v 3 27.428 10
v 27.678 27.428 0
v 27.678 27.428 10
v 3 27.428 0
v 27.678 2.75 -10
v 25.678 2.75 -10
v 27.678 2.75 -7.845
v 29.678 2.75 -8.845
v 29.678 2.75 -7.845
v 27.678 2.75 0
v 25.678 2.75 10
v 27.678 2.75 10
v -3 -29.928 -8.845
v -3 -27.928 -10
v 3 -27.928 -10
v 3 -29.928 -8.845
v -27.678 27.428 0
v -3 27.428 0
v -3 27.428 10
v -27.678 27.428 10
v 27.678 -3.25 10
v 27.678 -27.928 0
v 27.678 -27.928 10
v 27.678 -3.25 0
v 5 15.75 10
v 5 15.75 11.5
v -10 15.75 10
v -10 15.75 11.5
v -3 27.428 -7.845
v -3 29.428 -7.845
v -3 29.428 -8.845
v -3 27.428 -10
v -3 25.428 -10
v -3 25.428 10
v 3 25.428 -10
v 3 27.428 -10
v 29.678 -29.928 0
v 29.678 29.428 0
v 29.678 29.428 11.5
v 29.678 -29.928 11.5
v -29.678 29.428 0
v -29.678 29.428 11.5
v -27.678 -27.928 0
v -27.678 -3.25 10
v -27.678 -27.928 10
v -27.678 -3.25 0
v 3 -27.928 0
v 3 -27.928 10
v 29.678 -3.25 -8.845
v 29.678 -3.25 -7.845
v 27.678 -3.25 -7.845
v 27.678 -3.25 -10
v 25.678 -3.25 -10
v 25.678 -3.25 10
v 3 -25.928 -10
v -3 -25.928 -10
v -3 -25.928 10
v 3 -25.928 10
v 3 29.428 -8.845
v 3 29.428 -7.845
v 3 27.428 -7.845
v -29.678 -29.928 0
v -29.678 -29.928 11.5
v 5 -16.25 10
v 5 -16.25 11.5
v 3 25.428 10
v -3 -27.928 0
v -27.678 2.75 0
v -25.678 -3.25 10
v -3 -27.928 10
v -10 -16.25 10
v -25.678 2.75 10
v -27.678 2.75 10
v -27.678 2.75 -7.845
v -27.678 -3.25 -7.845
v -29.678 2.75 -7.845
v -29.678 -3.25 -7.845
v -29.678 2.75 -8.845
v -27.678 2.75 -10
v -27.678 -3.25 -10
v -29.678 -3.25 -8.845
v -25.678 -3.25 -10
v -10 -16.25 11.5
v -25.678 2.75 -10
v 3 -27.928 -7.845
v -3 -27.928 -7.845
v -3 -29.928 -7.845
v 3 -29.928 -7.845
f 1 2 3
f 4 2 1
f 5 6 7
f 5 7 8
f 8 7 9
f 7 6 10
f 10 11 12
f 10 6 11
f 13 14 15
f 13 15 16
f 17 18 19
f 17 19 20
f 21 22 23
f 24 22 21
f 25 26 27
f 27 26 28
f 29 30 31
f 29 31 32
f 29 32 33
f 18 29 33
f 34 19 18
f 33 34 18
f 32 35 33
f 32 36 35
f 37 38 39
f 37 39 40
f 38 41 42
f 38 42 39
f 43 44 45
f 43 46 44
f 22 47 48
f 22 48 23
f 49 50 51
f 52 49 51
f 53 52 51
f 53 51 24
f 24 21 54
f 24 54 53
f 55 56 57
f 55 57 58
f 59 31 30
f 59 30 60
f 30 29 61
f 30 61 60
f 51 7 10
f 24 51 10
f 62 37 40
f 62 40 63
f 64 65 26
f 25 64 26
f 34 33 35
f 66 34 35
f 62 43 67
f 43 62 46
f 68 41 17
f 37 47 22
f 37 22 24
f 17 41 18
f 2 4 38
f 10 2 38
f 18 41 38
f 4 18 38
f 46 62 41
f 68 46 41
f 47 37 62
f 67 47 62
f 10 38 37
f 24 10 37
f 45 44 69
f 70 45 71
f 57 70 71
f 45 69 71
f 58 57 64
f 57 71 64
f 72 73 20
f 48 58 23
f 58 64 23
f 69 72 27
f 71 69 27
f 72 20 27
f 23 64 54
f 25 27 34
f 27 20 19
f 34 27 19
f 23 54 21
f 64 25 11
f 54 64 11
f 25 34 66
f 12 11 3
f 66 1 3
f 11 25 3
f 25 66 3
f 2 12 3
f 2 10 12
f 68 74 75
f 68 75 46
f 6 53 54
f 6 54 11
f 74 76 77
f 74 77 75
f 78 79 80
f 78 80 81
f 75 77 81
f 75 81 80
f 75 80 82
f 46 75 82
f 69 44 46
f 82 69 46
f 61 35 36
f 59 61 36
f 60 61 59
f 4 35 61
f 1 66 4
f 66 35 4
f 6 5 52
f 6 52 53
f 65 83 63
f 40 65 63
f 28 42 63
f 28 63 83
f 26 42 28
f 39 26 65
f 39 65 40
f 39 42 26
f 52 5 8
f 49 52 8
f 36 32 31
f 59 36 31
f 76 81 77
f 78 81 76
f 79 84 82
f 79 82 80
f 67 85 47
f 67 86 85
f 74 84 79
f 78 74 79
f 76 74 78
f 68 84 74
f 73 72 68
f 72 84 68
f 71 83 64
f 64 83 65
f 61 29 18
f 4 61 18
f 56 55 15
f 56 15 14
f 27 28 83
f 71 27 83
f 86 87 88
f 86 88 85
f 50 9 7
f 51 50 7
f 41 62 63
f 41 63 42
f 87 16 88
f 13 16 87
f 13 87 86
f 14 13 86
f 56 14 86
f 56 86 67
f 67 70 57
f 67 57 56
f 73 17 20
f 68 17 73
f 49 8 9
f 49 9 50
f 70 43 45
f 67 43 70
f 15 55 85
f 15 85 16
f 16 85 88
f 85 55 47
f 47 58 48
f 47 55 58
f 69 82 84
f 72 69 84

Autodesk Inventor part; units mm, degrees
ref_plane "YZ Plane" through (0, 0, 0) normal (1, 0, 0) x (0, 1, 0)
ref_plane "XZ Plane" through (0, 0, 0) normal (0, 1, 0) x (-1, 0, 0)
ref_plane "XY Plane" through (0, 0, 0) normal (0, 0, 1) x (1, 0, 0)
sketch "Эскиз1" plane through (0, 0, 0) normal (0, 0, 1) x (1, 0, 0)
  line L0 (41.178, 40.928) -> (-41.178, 40.928) construction
  line L1 (-41.178, 40.928) -> (-41.178, -40.928) construction
  line L2 (-41.178, -40.928) -> (41.178, -40.928) construction
  line L3 (41.178, -40.928) -> (41.178, 40.928) construction
  circle A0 centre (22.7283, 19.0964) radius 1 construction
  circle A1 centre (19.3464, -22.9783) radius 1 construction
  line L4 (17.2251, 27.428) -> (22.7282, 21.9249) construction
  line L5 (22.7282, 21.9249) -> (19.8998, 19.0964) construction
  line L6 (19.8998, 19.0964) -> (22.7282, 16.268) construction
  line L7 (22.7282, 16.268) -> (25.5567, 19.0964) construction
  line L8 (25.5567, 19.0964) -> (27.678, 16.9751) construction
  line L9 (27.678, 16.9751) -> (27.678, -17.4751) construction
  line L10 (27.678, -17.4751) -> (22.1749, -22.9783) construction
  line L11 (22.1749, -22.9783) -> (19.3464, -20.1498) construction
  line L12 (19.3464, -20.1498) -> (16.518, -22.9783) construction
  line L13 (16.518, -22.9783) -> (19.3464, -25.8067) construction
  line L14 (19.3464, -25.8067) -> (17.2251, -27.928) construction
  line L15 (17.2251, -27.928) -> (-17.2251, -27.928) construction
  line L16 (-17.2251, -27.928) -> (-19.3464, -25.8067) construction
  line L17 (-19.3464, -25.8067) -> (-16.518, -22.9783) construction
  line L18 (-16.518, -22.9783) -> (-19.3464, -20.1498) construction
  line L19 (-19.3464, -20.1498) -> (-22.1749, -22.9783) construction
  line L20 (-22.1749, -22.9783) -> (-27.678, -17.4751) construction
  line L21 (-27.678, -17.4751) -> (-27.678, 16.9751) construction
  line L22 (-27.678, 16.9751) -> (-25.9871, 18.666) construction
  line L23 (-17.2251, 27.428) -> (17.2251, 27.428) construction
  line L24 (27.678, 27.428) -> (-27.678, 27.428)
  line L25 (-27.678, 27.428) -> (-27.678, -27.928)
  line L26 (-27.678, -27.928) -> (27.678, -27.928)
  line L27 (27.678, -27.928) -> (27.678, 27.428)
  line L28 (29.678, -29.928) -> (-29.678, -29.928)
  line L29 (-29.678, -29.928) -> (-29.678, 29.428)
  line L30 (-29.678, 29.428) -> (29.678, 29.428)
  line L31 (29.678, 29.428) -> (29.678, -29.928)
  circle A2 centre (-23.1587, 18.7154) radius 1 projected
  circle A3 centre (-19.3738, -22.9783) radius 1 projected
  line L32 (-25.9871, 18.666) -> (-23.1587, 15.8376) projected
  line L33 (-23.1587, 15.8376) -> (-20.3302, 18.666) projected
  line L34 (-20.3302, 18.666) -> (-23.1587, 21.4944) projected
  line L35 (-23.1587, 21.4944) -> (-17.2251, 27.428) projected
  point P0 (0, 0)
  dimension "d0" = 2
extrude "Выдавливание1" add sketch "Эскиз1" along normal blind 10 contours L28 L29 L30 L31
sketch "Эскиз2" plane through (0, 0, 10) normal (0, 0, 1) x (1, 0, 0)
  line L0 (29.678, 29.428) -> (-29.678, 29.428) projected
  line L1 (-29.678, 29.428) -> (-29.678, -29.928) projected
  line L2 (29.678, 29.428) -> (-29.678, 29.428)
  line L3 (-29.678, 29.428) -> (-29.678, -29.928)
  line L4 (-29.678, -29.928) -> (29.678, -29.928)
  line L5 (29.678, -29.928) -> (29.678, 29.428)
  point P0 (0, 0)
extrude "Выдавливание2" add sketch "Эскиз2" along normal blind 1.5
sketch "Эскиз3" plane through (0, 0, 10) normal (0, 0, -1) x (-1, 0, 0)
  line L0 (-27.678, 27.428) -> (-27.678, -27.928) construction
  line L1 (-27.678, -27.928) -> (27.678, -27.928) construction
  line L2 (27.678, -27.928) -> (27.678, 27.428) construction
  line L3 (27.678, 27.428) -> (-27.678, 27.428) construction
  line L4 (-29.678, -29.928) -> (-29.678, 29.428) construction
  line L5 (-29.678, -3.25) -> (-25.678, -3.25)
  line L6 (-25.678, -3.25) -> (-25.678, 2.75)
  line L7 (-25.678, 2.75) -> (-29.678, 2.75)
  line L8 (-29.678, 2.75) -> (-29.678, -3.25)
  line L9 (-27.678, 27.428) -> (-27.678, -27.928) construction
  line L10 (-27.678, -0.25) -> (27.678, -0.25) construction
  line L11 (0, -27.928) -> (0, 27.428) construction
  line L12 (29.678, -3.25) -> (25.678, -3.25)
  line L13 (25.678, -3.25) -> (25.678, 2.75)
  line L14 (25.678, 2.75) -> (29.678, 2.75)
  line L15 (29.678, 2.75) -> (29.678, -3.25)
  line L16 (-29.678, 29.428) -> (29.678, 29.428) construction
  line L17 (-3, 29.428) -> (3, 29.428)
  line L18 (3, 29.428) -> (3, 25.428)
  line L19 (3, 25.428) -> (-3, 25.428)
  line L20 (-3, 25.428) -> (-3, 29.428)
  line L21 (-3, -29.928) -> (3, -29.928)
  line L22 (3, -29.928) -> (3, -25.928)
  line L23 (3, -25.928) -> (-3, -25.928)
  line L24 (-3, -25.928) -> (-3, -29.928)
  point P0 (0, 0)
  dimension "d5" = 4
  dimension "d6" = 6
  dimension "d7" = 3
  dimension "d8" = 6
  dimension "d9" = 4
  dimension "d10" = 3
extrude "Выдавливание3" add sketch "Эскиз3" along normal blind 20
sketch "Эскиз4" plane through (0, 0, 11.5) normal (0, 0, 1) x (1, 0, 0)
  line L0 (-10, -16.25) -> (5, -16.25)
  line L1 (5, -16.25) -> (5, 15.75)
  line L2 (5, 15.75) -> (-10, 15.75)
  line L3 (-10, 15.75) -> (-10, -16.25)
  line L4 (-29.678, 29.428) -> (-29.678, -29.928) construction
  point P0 (0, 0)
  point P1 (-29.678, -0.25)
  dimension "d13" = 15
  dimension "d14" = 32
  dimension "d15" = 16
  dimension "d16" = 5
extrude "Выдавливание4" cut sketch "Эскиз4" against normal through all
sketch "Эскиз5" plane through (-3, -27.928, 10) normal (-1, 0, 0) x (0, 0, 1)
  line L0 (-20, -2) -> (-20, 2) projected
  line L1 (-20, 0) -> (-18.8453, -2)
  line L2 (-10, -2) -> (-20, -2) projected
  line L3 (-20, 0) -> (-17.6906, 0) construction
  line L4 (-18.8453, -2) -> (-17.8453, -2)
  line L5 (0, 2) -> (-20, 2) projected
  line L6 (-17.8453, -2) -> (-17.8453, 0)
  line L7 (-10, -2) -> (-10, 0) projected
  line L8 (-17.8453, 0) -> (-10, 0)
  line L9 (-10, 0) -> (-10, -2)
  line L10 (-10, -2) -> (-17.8453, -2)
  line L11 (-18.8453, -2) -> (-20, -2)
  line L12 (-20, -2) -> (-20, 0)
  point P0 (-10, 27.928)
  point P1 (-17.8453, -2)
  dimension "d19" = 60
  dimension "d20" = 1
extrude "Выдавливание5" cut sketch "Эскиз5" against normal up to surface (6 mm away)
sketch "Эскиз6" plane through (-3, 25.428, 10) normal (-1, 0, 0) x (0, 0, 1)
  line L0 (-20, 4) -> (-20, 0) projected
  line L1 (-20, 2) -> (-18.8453, 4)
  line L2 (-10, 4) -> (-20, 4) projected
  line L3 (-20, 2) -> (-17.6906, 2) construction
  line L4 (-10, 4) -> (1.5, 4) projected
  line L5 (-17.8453, 4) -> (-10, 4)
  line L6 (-10, 4) -> (-10, 2)
  line L7 (-10, -22.678) -> (-10, 4) projected
  line L8 (-17.8453, 2) -> (-17.8453, 4)
  line L9 (-17.8453, 2) -> (-10, 2)
  line L10 (-10, 2) -> (-10, 4)
  line L11 (-20, 2) -> (-20, 4)
  line L12 (-18.8453, 4) -> (-20, 4)
  point P0 (-10, -25.428)
  dimension "d23" = 60
extrude "Выдавливание6" cut sketch "Эскиз6" against normal up to surface (6 mm away)
sketch "Эскиз7" plane through (25.678, 2.75, 10) normal (0, 1, 0) x (1, 0, 0)
  line L0 (4, 20) -> (0, 20) projected
  line L1 (2, 20) -> (4, 18.8453)
  line L2 (4, 10) -> (4, 20) projected
  line L3 (2, 20) -> (4.3094, 20) construction
  line L4 (4, 18.8453) -> (4, 20)
  line L5 (0, 20) -> (4, 20) projected
  line L6 (4, 20) -> (2, 20)
  line L7 (4, 17.8453) -> (2, 17.8453)
  line L8 (2, 10) -> (2, 0) projected
  line L9 (2, 17.8453) -> (2, 10)
  line L10 (-55.356, 10) -> (4, 10) projected
  line L11 (2, 10) -> (4, 10)
  line L12 (-22.678, 10) -> (2, 10) projected
  line L13 (4, 10) -> (2, 10)
  line L14 (4, 10) -> (4, 17.8453)
  point P0 (-25.678, 10)
  dimension "d27" = 30
extrude "Выдавливание7" cut sketch "Эскиз7" against normal up to surface (6 mm away)
sketch "Эскиз8" plane through (-27.678, 2.75, 10) normal (0, 1, 0) x (1, 0, 0)
  line L0 (-2, 20) -> (2, 20) projected
  line L1 (0, 20) -> (-2, 20)
  line L2 (0, 20) -> (-2, 18.8453)
  line L3 (-2, 10) -> (-2, 20) projected
  line L4 (0, 20) -> (2.3094, 20) construction
  line L5 (-2, 17.8453) -> (0, 17.8453)
  line L6 (0, 10) -> (0, 0) projected
  line L7 (0, 17.8453) -> (0, 10)
  line L8 (-2, 10) -> (57.356, 10) projected
  line L9 (0, 10) -> (-2, 10)
  line L10 (-2, 10) -> (-2, 17.8453)
  line L11 (-2, 18.8453) -> (-2, 20)
  point P0 (27.678, 10)
  dimension "d31" = 150
extrude "Выдавливание8" cut sketch "Эскиз8" against normal up to surface (6 mm away)
properties part number "Верх"
